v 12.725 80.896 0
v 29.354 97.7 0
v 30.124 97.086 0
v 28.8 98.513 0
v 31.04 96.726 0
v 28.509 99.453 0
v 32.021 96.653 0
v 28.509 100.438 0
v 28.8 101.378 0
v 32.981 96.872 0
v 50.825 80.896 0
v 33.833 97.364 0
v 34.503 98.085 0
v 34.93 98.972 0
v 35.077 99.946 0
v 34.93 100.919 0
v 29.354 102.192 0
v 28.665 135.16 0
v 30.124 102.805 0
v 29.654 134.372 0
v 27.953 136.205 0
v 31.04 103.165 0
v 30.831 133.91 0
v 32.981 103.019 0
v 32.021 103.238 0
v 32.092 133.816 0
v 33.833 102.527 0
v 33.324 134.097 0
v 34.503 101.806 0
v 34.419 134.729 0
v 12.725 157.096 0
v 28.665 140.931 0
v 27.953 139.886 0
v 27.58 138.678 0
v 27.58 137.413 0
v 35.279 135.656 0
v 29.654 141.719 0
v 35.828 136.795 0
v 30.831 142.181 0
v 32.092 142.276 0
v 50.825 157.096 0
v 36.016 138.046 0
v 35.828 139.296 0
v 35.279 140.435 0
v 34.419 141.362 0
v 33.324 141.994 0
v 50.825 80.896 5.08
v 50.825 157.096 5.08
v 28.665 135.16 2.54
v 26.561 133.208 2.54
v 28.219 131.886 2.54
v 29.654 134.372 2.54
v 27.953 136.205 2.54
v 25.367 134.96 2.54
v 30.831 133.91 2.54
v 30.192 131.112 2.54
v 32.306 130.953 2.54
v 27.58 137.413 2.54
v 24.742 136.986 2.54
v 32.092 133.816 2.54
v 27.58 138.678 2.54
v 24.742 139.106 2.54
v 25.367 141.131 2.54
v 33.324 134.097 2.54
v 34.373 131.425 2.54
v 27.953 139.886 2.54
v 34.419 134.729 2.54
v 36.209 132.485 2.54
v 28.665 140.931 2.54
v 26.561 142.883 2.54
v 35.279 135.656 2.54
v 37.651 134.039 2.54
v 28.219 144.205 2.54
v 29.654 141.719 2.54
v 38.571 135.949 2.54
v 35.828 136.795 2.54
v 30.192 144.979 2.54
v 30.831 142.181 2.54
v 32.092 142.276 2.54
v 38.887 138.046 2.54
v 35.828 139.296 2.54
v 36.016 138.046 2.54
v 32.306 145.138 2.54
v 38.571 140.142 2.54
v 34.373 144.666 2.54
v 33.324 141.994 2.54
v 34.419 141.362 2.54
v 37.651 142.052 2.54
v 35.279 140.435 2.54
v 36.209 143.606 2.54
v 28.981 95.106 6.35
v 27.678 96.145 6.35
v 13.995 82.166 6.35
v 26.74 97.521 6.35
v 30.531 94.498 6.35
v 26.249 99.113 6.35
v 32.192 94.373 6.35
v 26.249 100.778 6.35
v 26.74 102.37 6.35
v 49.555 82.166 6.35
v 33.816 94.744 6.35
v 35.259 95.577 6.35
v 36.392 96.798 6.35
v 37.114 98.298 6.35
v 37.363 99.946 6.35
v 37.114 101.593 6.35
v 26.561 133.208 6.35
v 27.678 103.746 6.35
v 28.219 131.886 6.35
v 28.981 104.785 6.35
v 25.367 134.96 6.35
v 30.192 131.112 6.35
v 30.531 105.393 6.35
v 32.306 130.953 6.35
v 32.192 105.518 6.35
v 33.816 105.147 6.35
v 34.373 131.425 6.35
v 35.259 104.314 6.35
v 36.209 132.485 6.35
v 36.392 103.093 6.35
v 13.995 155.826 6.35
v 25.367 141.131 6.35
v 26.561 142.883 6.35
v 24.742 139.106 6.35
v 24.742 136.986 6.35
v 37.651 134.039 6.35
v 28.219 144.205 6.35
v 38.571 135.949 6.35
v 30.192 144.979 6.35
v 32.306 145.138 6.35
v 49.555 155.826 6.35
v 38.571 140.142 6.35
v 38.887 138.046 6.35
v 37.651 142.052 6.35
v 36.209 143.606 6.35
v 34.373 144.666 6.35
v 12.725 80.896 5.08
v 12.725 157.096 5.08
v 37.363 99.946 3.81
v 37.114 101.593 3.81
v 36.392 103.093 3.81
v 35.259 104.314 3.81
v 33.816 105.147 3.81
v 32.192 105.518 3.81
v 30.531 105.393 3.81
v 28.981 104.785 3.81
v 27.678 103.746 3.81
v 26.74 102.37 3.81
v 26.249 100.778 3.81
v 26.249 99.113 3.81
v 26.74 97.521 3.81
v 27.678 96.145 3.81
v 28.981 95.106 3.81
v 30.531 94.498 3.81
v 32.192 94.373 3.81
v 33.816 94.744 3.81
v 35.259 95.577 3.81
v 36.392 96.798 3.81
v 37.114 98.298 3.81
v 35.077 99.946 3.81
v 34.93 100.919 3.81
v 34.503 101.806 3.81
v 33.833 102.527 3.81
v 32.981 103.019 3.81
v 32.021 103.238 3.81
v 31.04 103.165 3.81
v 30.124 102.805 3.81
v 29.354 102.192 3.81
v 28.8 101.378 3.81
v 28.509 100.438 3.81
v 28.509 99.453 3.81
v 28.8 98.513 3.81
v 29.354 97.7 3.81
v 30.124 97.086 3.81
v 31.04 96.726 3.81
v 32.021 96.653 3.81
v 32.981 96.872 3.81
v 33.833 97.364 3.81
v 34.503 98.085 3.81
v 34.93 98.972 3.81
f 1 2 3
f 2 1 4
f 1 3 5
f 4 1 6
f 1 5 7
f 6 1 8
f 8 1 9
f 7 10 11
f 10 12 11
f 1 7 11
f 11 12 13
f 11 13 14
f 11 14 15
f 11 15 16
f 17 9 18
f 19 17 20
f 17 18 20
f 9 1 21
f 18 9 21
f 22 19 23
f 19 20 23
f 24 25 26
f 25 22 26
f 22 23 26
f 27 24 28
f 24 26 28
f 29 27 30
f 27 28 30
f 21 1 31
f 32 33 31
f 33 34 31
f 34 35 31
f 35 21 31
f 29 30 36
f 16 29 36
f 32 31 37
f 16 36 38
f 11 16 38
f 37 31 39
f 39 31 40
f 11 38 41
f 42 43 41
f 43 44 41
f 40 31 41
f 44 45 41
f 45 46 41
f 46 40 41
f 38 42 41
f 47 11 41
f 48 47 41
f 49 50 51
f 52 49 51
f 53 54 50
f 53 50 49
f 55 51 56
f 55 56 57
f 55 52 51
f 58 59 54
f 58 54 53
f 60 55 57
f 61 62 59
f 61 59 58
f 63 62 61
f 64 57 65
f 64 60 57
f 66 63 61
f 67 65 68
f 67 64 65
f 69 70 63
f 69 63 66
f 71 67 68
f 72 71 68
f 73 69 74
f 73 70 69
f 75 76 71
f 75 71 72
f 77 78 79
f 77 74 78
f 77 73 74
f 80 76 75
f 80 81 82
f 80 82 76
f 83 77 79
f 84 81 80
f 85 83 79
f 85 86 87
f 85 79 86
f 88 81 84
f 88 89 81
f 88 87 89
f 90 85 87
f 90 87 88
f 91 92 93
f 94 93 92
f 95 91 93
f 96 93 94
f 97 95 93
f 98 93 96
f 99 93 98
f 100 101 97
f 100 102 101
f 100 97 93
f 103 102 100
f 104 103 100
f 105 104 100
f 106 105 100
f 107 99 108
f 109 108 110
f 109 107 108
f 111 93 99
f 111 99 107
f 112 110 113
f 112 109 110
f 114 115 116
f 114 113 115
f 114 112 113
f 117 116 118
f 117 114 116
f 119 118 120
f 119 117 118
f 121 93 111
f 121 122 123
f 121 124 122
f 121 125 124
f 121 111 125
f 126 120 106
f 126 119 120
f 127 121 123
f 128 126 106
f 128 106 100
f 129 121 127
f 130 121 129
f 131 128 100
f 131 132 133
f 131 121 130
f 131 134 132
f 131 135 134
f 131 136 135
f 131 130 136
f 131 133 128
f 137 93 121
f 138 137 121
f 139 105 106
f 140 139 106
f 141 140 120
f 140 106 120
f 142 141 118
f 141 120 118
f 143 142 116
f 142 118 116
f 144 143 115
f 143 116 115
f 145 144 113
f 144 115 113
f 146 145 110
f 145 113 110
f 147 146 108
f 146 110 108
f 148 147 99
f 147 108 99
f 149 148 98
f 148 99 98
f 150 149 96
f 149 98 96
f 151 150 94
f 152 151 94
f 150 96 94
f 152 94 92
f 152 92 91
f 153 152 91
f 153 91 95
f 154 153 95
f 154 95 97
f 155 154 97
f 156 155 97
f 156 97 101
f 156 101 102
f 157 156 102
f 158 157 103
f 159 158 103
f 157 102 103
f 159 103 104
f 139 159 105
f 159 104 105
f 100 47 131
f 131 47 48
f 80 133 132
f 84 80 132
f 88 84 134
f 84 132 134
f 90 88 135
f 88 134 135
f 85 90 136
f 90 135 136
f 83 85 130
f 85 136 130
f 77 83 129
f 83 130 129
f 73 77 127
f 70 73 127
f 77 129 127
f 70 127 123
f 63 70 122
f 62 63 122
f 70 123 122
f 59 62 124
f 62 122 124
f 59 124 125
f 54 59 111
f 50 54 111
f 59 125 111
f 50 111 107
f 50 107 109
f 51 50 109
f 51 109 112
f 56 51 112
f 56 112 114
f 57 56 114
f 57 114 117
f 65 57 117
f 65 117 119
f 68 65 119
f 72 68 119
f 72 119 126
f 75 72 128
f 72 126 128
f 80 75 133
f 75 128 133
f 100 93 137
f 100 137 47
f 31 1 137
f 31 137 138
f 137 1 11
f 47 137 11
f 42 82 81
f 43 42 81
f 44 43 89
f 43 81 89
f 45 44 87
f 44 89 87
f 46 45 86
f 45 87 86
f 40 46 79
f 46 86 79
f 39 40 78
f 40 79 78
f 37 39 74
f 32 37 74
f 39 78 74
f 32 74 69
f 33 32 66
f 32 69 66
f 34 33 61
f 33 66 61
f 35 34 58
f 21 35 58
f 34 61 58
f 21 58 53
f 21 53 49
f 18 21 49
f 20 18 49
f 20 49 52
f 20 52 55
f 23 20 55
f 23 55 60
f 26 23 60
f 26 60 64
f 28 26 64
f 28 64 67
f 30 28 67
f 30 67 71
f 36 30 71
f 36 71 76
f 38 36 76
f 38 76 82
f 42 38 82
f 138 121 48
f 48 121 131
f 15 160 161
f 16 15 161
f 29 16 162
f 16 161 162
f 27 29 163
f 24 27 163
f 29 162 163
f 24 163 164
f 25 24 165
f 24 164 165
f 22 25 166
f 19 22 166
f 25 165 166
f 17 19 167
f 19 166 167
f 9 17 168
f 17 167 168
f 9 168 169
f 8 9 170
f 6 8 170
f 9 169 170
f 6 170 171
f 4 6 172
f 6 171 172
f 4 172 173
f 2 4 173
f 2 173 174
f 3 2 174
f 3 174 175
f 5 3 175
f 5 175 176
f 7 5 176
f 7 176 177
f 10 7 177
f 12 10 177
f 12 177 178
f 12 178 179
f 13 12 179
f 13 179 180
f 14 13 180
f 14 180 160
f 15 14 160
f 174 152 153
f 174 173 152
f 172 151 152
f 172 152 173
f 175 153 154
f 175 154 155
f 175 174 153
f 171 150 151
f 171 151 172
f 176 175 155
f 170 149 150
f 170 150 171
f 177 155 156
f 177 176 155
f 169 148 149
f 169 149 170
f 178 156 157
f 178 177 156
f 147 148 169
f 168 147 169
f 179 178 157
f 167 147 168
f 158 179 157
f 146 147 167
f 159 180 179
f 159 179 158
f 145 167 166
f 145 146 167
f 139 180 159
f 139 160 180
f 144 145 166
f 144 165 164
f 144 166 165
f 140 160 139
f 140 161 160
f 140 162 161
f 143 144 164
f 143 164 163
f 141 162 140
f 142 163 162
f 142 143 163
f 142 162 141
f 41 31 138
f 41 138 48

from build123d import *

# Parameters (mm, degrees)
SKETCH1_W           = 38.1
SKETCH1_H           = 76.2
BOSS_EXTRUDE1_DEPTH = 6.35
SKETCH2_R           = 4.2418
SKETCH2_R_2         = 3.302
CUT_EXTRUDE1_DEPTH  = 6.35
CHAMFER1_SIZE       = 1.27
SKETCH4_R           = 5.588
CUT_EXTRUDE2_DEPTH  = 2.54
SKETCH3_R           = 7.112
CUT_EXTRUDE3_DEPTH  = 3.81


with BuildPart() as part:
    # Sketch1 → Boss-Extrude1 (new body)
    with BuildSketch(Plane.XY):
        with Locations((31.774534541, 118.99557006)):
            Rectangle(SKETCH1_W, SKETCH1_H)
    extrude(amount=BOSS_EXTRUDE1_DEPTH)

    # Sketch2 → Cut-Extrude1 (cut)
    with BuildSketch(Plane.XY.offset(6.35)):
        with Locations((31.774534541, 138.04557006)):
            Circle(SKETCH2_R)
        with Locations((31.774534541, 99.94557006)):
            Circle(SKETCH2_R_2)
    extrude(amount=-CUT_EXTRUDE1_DEPTH, mode=Mode.SUBTRACT)

    # Chamfer1
    chamfer1_edges = [part.edges().sort_by_distance(p)[0] for p in [
        (50.824534541, 118.99557006, 6.35),
        (31.774534541, 157.09557006, 6.35),
        (12.724534541, 118.99557006, 6.35),
        (31.774534541, 80.89557006, 6.35),
    ]]
    chamfer(chamfer1_edges, length=CHAMFER1_SIZE)

    # Sketch4 → Cut-Extrude2 (cut)
    with BuildSketch(Plane.XY.offset(6.35)):
        with Locations((31.774534541, 99.94557006)):
            Circle(SKETCH4_R)
    extrude(amount=-CUT_EXTRUDE2_DEPTH, mode=Mode.SUBTRACT)

    # Sketch3 → Cut-Extrude3 (cut)
    with BuildSketch(Plane.XY.offset(6.35)):
        with Locations((31.774534541, 138.04557006)):
            Circle(SKETCH3_R)
    extrude(amount=-CUT_EXTRUDE3_DEPTH, mode=Mode.SUBTRACT)


solid = part.part
